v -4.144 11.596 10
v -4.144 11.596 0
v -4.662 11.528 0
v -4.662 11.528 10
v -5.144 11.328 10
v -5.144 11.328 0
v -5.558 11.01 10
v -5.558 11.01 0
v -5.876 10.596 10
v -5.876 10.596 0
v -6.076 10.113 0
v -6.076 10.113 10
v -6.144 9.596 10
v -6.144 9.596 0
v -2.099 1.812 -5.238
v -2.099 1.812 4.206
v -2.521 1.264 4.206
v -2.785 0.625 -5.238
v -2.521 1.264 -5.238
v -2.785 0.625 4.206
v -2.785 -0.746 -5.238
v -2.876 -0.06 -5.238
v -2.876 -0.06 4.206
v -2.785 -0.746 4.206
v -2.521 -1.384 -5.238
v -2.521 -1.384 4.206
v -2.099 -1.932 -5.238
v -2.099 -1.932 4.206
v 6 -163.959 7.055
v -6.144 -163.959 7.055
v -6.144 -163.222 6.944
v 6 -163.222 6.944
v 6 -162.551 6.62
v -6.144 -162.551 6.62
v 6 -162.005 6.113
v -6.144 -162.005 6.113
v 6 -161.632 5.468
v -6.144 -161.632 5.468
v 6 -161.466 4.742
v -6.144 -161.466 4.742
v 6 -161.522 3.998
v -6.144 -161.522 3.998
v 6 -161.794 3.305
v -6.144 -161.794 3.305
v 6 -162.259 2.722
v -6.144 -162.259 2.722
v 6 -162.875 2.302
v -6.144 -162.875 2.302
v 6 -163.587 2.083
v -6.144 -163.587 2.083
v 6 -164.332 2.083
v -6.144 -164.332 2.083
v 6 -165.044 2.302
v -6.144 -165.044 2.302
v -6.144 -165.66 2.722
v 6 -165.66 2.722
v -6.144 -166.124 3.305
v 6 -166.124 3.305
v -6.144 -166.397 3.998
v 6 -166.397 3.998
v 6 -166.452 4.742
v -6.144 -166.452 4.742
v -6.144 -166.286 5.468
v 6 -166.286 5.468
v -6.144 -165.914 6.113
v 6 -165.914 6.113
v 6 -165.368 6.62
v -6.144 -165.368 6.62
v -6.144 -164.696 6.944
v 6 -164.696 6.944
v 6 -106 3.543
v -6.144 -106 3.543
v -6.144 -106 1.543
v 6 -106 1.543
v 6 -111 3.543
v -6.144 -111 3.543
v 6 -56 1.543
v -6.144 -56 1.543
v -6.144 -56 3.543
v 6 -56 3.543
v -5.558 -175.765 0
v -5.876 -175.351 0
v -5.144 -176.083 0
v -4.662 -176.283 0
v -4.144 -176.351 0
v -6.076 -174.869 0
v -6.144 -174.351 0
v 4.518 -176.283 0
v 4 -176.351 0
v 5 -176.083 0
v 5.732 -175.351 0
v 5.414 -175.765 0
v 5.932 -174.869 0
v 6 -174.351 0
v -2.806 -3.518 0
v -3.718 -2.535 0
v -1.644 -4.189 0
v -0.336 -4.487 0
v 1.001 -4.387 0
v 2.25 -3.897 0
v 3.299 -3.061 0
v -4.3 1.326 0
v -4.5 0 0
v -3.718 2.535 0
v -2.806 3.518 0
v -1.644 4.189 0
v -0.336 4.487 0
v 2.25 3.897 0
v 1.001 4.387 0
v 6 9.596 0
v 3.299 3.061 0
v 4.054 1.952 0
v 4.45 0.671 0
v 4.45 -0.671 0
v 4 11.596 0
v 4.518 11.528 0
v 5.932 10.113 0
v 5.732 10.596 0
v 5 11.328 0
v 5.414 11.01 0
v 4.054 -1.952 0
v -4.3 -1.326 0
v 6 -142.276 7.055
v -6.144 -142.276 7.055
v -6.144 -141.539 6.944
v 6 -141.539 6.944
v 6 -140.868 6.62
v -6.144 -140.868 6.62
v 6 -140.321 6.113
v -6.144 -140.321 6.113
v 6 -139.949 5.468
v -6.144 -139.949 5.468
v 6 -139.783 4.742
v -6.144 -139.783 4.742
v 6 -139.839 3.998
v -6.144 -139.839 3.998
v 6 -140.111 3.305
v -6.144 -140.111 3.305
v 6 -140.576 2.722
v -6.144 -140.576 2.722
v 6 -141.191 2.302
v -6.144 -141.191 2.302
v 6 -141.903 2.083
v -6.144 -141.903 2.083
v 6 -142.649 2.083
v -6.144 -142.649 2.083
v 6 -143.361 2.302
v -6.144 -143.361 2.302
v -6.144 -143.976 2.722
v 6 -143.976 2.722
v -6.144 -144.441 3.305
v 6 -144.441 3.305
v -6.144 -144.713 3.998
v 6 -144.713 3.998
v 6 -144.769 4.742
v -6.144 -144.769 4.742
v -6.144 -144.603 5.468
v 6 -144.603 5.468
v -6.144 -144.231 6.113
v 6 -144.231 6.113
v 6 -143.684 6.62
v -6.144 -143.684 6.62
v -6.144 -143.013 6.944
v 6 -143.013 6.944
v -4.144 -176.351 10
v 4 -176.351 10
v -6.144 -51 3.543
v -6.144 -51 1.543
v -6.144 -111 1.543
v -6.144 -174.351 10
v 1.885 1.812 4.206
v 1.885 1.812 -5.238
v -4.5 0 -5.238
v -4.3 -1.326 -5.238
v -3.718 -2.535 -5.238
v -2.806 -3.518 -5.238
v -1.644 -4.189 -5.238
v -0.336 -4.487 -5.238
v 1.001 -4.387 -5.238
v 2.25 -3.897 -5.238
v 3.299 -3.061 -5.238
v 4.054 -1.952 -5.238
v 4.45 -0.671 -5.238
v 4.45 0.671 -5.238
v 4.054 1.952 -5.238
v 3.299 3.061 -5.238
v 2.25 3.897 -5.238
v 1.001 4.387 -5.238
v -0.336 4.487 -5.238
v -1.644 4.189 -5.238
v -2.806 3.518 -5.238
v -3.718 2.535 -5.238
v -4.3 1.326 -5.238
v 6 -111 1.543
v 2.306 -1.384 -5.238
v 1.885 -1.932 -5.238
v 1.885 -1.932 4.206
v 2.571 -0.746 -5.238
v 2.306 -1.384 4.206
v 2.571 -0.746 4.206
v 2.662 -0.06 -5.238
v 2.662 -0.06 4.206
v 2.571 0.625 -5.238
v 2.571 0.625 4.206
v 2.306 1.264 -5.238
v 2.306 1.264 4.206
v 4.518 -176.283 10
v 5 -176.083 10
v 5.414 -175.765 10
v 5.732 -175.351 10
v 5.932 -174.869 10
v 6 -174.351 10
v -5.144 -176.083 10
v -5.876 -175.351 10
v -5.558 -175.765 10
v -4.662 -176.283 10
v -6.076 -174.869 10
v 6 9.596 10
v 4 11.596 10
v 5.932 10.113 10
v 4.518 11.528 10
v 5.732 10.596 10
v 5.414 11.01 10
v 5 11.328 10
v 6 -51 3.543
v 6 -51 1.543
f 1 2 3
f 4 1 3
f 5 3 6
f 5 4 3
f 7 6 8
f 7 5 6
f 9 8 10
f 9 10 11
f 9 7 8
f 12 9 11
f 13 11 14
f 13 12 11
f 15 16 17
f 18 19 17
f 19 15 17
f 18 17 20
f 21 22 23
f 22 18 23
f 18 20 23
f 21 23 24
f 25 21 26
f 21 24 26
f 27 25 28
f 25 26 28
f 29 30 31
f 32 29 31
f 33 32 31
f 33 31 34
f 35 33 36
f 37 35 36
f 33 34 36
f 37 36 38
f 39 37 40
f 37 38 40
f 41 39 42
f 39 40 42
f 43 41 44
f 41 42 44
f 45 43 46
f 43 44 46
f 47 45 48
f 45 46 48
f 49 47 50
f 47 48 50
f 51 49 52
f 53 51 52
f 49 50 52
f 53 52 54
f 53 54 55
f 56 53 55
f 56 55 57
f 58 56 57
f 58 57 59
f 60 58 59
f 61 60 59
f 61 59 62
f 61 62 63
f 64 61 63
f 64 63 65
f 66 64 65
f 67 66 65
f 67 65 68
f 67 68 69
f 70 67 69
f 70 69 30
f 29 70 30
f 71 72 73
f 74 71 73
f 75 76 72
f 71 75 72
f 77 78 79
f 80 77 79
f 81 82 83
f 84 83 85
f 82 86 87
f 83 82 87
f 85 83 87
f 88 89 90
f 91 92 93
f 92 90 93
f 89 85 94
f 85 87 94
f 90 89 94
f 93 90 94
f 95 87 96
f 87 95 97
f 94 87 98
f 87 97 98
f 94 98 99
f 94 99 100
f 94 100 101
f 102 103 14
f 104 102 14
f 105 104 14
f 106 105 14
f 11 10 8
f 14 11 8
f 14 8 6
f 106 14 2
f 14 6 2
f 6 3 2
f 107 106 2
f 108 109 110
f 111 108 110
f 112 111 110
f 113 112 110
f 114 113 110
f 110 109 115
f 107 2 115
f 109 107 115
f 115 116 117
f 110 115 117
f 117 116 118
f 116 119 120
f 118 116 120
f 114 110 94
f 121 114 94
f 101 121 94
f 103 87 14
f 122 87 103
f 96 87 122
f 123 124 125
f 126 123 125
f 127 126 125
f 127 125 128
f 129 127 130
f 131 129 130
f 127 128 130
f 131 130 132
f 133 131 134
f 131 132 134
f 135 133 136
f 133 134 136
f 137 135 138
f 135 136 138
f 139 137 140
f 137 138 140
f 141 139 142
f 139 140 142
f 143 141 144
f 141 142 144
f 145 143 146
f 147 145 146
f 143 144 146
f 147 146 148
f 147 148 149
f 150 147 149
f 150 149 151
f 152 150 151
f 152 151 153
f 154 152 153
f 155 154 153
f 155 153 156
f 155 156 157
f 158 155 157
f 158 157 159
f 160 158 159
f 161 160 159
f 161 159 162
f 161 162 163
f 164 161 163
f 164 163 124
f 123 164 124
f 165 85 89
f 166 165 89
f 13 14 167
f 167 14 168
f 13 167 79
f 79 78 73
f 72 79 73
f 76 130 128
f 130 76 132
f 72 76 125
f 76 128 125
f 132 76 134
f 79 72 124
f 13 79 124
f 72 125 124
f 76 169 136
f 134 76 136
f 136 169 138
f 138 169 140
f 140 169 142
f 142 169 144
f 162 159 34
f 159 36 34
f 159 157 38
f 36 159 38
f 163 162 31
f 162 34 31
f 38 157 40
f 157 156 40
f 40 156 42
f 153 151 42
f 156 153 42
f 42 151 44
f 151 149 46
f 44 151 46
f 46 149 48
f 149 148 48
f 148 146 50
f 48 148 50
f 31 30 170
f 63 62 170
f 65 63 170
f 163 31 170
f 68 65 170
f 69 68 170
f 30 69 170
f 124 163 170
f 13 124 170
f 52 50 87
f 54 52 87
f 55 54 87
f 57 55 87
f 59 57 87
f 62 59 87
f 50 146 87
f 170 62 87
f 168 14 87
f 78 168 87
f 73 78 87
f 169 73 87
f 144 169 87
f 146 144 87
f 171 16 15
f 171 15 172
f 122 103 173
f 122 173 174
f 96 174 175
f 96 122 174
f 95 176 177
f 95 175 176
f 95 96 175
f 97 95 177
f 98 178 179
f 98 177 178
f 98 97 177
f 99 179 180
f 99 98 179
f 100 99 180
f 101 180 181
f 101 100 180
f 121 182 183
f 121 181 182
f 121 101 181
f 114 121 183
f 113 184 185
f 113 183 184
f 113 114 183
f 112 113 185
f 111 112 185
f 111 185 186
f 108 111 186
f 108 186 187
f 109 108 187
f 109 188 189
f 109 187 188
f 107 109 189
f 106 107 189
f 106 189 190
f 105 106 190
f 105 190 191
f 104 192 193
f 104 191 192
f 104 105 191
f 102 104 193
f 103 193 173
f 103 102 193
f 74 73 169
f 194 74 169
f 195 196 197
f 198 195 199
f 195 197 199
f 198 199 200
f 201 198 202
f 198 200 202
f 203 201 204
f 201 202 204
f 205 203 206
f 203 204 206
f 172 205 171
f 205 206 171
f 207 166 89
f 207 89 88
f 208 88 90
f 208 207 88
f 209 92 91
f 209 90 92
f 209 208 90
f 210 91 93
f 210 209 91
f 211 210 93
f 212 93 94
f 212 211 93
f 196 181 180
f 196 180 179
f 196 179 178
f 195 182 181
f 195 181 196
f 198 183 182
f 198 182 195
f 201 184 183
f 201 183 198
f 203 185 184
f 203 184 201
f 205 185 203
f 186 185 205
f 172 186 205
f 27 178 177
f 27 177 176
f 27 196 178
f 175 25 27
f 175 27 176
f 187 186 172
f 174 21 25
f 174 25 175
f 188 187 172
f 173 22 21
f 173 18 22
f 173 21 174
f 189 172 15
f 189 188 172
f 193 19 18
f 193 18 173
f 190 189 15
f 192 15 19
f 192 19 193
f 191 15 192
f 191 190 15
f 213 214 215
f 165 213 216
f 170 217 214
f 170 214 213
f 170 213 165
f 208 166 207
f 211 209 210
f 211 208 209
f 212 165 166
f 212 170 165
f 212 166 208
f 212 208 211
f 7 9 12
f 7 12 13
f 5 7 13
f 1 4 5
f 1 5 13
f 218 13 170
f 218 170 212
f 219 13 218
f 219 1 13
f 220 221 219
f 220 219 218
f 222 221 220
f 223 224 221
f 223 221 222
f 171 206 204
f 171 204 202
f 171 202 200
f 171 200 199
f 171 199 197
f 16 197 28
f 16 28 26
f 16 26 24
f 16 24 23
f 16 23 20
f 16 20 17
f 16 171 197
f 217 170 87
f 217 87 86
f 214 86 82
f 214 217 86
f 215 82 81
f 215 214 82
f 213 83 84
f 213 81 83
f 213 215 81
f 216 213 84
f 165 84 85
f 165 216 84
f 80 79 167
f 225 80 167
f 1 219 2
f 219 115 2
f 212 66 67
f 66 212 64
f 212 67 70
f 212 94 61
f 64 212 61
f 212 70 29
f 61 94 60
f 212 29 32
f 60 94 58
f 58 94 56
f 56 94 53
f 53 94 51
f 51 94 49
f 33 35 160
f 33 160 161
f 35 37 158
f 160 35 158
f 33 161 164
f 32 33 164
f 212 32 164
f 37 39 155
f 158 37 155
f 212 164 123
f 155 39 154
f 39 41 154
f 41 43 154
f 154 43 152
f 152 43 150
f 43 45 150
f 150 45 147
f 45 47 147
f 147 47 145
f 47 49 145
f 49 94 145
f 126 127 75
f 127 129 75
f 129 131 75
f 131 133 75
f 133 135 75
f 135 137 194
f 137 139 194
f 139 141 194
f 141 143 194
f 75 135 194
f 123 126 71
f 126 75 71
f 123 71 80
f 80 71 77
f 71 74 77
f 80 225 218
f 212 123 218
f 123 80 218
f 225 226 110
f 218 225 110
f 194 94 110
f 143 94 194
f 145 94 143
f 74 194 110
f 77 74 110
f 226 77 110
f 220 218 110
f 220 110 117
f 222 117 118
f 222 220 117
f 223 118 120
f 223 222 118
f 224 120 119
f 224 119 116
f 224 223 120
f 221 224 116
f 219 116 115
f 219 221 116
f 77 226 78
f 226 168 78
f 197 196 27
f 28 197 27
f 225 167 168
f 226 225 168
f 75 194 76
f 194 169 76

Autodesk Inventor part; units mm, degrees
ref_plane "YZ Plane" through (0, 0, 0) normal (1, 0, 0) x (0, 1, 0)
ref_plane "XZ Plane" through (0, 0, 0) normal (0, 1, 0) x (-1, 0, 0)
ref_plane "XY Plane" through (0, 0, 0) normal (0, 0, 1) x (1, 0, 0)
sketch "Sketch1" plane through (0, 0, 0) normal (0, 0, 1) x (1, 0, 0)
  line L0 (-2.0384, 1.8879) -> (2.0592, 1.8879)
  line L1 (2.0592, 1.8879) -> (2.0592, -1.9739)
  line L2 (2.0592, -1.9739) -> (-2.0384, -1.9739)
  line L3 (-2.0384, -1.9739) -> (-2.0384, 1.8879)
  arc A0 (2.0592, -1.9739) -> (2.0592, 1.8879) centre (-0.1442, -0.043) ccw
  arc A1 (-2.0384, 1.8879) -> (-2.0384, -1.9739) centre (-0.6409, -0.043) ccw
  line L4 (6, 11.5957) -> (-6.1442, 11.5957)
  line L5 (-6.1442, 11.5957) -> (-6.1442, -176.351)
  line L6 (-6.1442, -176.351) -> (6, -176.351)
  line L7 (6, -176.351) -> (6, 11.5957)
  point P0 (0, 0)
  dimension "d2" = 6
  dimension "d3" = 6
extrude "Extrusion1" add sketch "Sketch1" along normal blind 10
sketch "Sketch2" plane through (-6.1442, -176.351, 0) normal (-1, 0, 0) x (0, 0, 1)
  line L0 (3.5426, 125.3505) -> (1.5426, 125.3505)
  line L1 (1.5426, 125.3505) -> (1.5426, 120.3505)
  line L2 (1.5426, 120.3505) -> (3.5426, 120.3505)
  line L3 (3.5426, 120.3505) -> (3.5426, 125.3505)
  line L4 (3.5426, 70.3505) -> (1.5426, 70.3505)
  line L5 (1.5426, 70.3505) -> (1.5426, 65.3505)
  line L6 (1.5426, 65.3505) -> (3.5426, 65.3505)
  line L7 (3.5426, 65.3505) -> (3.5426, 70.3505)
  circle A0 centre (4.5547, 34.075) radius 2.5
  circle A1 centre (4.5547, 12.3917) radius 2.5
  point P0 (0, 176.351)
  dimension "d4" = 2
  dimension "d5" = 5
  dimension "d6" = 2
  dimension "d7" = 5
  dimension "d10" = 50
  dimension "d11" = 5
  dimension "d12" = 5
extrude "Extrusion2" cut sketch "Sketch2" against normal through all
sketch "Sketch3" plane through (-6.1442, -176.351, 0) normal (-1, 0, 0) x (0, 0, 1)
  point P0 (0, 176.351)
sketch "Sketch4" plane through (0, 0, 0) normal (0, 0, -1) x (-1, 0, 0)
  circle A0 centre (0, 0) radius 4.5
  dimension "d13" = 9
extrude "Extrusion3" add sketch "Sketch4" along normal blind 5.2375 and the other way blind 10
sketch "Sketch5" plane through (0, 0, 0) normal (0, 0, -1) x (-1, 0, 0)
  line L0 (2.0992, 1.8119) -> (-1.885, 1.8119)
  line L1 (-1.885, 1.8119) -> (-1.885, -1.9325)
  line L2 (-1.885, -1.9325) -> (2.0992, -1.9325)
  line L3 (2.0992, -1.9325) -> (2.0992, 1.8119)
  arc A0 (2.0992, -1.9325) -> (2.0992, 1.8119) centre (0.2308, -0.0603) ccw
  arc A1 (-1.885, 1.8119) -> (-1.885, -1.9325) centre (-0.0175, -0.0603) ccw
  point P0 (0, 0)
extrude "Extrusion4" cut sketch "Sketch5" along normal blind 5.2375 and the other way blind 4.2065
fillet "Fillet1" radius 2 4 edges at (6, 11.5957, 5) (-6.1442, 11.5957, 5) (-6.1442, -176.351, 5) (6, -176.351, 5)
properties part number "Arm"
